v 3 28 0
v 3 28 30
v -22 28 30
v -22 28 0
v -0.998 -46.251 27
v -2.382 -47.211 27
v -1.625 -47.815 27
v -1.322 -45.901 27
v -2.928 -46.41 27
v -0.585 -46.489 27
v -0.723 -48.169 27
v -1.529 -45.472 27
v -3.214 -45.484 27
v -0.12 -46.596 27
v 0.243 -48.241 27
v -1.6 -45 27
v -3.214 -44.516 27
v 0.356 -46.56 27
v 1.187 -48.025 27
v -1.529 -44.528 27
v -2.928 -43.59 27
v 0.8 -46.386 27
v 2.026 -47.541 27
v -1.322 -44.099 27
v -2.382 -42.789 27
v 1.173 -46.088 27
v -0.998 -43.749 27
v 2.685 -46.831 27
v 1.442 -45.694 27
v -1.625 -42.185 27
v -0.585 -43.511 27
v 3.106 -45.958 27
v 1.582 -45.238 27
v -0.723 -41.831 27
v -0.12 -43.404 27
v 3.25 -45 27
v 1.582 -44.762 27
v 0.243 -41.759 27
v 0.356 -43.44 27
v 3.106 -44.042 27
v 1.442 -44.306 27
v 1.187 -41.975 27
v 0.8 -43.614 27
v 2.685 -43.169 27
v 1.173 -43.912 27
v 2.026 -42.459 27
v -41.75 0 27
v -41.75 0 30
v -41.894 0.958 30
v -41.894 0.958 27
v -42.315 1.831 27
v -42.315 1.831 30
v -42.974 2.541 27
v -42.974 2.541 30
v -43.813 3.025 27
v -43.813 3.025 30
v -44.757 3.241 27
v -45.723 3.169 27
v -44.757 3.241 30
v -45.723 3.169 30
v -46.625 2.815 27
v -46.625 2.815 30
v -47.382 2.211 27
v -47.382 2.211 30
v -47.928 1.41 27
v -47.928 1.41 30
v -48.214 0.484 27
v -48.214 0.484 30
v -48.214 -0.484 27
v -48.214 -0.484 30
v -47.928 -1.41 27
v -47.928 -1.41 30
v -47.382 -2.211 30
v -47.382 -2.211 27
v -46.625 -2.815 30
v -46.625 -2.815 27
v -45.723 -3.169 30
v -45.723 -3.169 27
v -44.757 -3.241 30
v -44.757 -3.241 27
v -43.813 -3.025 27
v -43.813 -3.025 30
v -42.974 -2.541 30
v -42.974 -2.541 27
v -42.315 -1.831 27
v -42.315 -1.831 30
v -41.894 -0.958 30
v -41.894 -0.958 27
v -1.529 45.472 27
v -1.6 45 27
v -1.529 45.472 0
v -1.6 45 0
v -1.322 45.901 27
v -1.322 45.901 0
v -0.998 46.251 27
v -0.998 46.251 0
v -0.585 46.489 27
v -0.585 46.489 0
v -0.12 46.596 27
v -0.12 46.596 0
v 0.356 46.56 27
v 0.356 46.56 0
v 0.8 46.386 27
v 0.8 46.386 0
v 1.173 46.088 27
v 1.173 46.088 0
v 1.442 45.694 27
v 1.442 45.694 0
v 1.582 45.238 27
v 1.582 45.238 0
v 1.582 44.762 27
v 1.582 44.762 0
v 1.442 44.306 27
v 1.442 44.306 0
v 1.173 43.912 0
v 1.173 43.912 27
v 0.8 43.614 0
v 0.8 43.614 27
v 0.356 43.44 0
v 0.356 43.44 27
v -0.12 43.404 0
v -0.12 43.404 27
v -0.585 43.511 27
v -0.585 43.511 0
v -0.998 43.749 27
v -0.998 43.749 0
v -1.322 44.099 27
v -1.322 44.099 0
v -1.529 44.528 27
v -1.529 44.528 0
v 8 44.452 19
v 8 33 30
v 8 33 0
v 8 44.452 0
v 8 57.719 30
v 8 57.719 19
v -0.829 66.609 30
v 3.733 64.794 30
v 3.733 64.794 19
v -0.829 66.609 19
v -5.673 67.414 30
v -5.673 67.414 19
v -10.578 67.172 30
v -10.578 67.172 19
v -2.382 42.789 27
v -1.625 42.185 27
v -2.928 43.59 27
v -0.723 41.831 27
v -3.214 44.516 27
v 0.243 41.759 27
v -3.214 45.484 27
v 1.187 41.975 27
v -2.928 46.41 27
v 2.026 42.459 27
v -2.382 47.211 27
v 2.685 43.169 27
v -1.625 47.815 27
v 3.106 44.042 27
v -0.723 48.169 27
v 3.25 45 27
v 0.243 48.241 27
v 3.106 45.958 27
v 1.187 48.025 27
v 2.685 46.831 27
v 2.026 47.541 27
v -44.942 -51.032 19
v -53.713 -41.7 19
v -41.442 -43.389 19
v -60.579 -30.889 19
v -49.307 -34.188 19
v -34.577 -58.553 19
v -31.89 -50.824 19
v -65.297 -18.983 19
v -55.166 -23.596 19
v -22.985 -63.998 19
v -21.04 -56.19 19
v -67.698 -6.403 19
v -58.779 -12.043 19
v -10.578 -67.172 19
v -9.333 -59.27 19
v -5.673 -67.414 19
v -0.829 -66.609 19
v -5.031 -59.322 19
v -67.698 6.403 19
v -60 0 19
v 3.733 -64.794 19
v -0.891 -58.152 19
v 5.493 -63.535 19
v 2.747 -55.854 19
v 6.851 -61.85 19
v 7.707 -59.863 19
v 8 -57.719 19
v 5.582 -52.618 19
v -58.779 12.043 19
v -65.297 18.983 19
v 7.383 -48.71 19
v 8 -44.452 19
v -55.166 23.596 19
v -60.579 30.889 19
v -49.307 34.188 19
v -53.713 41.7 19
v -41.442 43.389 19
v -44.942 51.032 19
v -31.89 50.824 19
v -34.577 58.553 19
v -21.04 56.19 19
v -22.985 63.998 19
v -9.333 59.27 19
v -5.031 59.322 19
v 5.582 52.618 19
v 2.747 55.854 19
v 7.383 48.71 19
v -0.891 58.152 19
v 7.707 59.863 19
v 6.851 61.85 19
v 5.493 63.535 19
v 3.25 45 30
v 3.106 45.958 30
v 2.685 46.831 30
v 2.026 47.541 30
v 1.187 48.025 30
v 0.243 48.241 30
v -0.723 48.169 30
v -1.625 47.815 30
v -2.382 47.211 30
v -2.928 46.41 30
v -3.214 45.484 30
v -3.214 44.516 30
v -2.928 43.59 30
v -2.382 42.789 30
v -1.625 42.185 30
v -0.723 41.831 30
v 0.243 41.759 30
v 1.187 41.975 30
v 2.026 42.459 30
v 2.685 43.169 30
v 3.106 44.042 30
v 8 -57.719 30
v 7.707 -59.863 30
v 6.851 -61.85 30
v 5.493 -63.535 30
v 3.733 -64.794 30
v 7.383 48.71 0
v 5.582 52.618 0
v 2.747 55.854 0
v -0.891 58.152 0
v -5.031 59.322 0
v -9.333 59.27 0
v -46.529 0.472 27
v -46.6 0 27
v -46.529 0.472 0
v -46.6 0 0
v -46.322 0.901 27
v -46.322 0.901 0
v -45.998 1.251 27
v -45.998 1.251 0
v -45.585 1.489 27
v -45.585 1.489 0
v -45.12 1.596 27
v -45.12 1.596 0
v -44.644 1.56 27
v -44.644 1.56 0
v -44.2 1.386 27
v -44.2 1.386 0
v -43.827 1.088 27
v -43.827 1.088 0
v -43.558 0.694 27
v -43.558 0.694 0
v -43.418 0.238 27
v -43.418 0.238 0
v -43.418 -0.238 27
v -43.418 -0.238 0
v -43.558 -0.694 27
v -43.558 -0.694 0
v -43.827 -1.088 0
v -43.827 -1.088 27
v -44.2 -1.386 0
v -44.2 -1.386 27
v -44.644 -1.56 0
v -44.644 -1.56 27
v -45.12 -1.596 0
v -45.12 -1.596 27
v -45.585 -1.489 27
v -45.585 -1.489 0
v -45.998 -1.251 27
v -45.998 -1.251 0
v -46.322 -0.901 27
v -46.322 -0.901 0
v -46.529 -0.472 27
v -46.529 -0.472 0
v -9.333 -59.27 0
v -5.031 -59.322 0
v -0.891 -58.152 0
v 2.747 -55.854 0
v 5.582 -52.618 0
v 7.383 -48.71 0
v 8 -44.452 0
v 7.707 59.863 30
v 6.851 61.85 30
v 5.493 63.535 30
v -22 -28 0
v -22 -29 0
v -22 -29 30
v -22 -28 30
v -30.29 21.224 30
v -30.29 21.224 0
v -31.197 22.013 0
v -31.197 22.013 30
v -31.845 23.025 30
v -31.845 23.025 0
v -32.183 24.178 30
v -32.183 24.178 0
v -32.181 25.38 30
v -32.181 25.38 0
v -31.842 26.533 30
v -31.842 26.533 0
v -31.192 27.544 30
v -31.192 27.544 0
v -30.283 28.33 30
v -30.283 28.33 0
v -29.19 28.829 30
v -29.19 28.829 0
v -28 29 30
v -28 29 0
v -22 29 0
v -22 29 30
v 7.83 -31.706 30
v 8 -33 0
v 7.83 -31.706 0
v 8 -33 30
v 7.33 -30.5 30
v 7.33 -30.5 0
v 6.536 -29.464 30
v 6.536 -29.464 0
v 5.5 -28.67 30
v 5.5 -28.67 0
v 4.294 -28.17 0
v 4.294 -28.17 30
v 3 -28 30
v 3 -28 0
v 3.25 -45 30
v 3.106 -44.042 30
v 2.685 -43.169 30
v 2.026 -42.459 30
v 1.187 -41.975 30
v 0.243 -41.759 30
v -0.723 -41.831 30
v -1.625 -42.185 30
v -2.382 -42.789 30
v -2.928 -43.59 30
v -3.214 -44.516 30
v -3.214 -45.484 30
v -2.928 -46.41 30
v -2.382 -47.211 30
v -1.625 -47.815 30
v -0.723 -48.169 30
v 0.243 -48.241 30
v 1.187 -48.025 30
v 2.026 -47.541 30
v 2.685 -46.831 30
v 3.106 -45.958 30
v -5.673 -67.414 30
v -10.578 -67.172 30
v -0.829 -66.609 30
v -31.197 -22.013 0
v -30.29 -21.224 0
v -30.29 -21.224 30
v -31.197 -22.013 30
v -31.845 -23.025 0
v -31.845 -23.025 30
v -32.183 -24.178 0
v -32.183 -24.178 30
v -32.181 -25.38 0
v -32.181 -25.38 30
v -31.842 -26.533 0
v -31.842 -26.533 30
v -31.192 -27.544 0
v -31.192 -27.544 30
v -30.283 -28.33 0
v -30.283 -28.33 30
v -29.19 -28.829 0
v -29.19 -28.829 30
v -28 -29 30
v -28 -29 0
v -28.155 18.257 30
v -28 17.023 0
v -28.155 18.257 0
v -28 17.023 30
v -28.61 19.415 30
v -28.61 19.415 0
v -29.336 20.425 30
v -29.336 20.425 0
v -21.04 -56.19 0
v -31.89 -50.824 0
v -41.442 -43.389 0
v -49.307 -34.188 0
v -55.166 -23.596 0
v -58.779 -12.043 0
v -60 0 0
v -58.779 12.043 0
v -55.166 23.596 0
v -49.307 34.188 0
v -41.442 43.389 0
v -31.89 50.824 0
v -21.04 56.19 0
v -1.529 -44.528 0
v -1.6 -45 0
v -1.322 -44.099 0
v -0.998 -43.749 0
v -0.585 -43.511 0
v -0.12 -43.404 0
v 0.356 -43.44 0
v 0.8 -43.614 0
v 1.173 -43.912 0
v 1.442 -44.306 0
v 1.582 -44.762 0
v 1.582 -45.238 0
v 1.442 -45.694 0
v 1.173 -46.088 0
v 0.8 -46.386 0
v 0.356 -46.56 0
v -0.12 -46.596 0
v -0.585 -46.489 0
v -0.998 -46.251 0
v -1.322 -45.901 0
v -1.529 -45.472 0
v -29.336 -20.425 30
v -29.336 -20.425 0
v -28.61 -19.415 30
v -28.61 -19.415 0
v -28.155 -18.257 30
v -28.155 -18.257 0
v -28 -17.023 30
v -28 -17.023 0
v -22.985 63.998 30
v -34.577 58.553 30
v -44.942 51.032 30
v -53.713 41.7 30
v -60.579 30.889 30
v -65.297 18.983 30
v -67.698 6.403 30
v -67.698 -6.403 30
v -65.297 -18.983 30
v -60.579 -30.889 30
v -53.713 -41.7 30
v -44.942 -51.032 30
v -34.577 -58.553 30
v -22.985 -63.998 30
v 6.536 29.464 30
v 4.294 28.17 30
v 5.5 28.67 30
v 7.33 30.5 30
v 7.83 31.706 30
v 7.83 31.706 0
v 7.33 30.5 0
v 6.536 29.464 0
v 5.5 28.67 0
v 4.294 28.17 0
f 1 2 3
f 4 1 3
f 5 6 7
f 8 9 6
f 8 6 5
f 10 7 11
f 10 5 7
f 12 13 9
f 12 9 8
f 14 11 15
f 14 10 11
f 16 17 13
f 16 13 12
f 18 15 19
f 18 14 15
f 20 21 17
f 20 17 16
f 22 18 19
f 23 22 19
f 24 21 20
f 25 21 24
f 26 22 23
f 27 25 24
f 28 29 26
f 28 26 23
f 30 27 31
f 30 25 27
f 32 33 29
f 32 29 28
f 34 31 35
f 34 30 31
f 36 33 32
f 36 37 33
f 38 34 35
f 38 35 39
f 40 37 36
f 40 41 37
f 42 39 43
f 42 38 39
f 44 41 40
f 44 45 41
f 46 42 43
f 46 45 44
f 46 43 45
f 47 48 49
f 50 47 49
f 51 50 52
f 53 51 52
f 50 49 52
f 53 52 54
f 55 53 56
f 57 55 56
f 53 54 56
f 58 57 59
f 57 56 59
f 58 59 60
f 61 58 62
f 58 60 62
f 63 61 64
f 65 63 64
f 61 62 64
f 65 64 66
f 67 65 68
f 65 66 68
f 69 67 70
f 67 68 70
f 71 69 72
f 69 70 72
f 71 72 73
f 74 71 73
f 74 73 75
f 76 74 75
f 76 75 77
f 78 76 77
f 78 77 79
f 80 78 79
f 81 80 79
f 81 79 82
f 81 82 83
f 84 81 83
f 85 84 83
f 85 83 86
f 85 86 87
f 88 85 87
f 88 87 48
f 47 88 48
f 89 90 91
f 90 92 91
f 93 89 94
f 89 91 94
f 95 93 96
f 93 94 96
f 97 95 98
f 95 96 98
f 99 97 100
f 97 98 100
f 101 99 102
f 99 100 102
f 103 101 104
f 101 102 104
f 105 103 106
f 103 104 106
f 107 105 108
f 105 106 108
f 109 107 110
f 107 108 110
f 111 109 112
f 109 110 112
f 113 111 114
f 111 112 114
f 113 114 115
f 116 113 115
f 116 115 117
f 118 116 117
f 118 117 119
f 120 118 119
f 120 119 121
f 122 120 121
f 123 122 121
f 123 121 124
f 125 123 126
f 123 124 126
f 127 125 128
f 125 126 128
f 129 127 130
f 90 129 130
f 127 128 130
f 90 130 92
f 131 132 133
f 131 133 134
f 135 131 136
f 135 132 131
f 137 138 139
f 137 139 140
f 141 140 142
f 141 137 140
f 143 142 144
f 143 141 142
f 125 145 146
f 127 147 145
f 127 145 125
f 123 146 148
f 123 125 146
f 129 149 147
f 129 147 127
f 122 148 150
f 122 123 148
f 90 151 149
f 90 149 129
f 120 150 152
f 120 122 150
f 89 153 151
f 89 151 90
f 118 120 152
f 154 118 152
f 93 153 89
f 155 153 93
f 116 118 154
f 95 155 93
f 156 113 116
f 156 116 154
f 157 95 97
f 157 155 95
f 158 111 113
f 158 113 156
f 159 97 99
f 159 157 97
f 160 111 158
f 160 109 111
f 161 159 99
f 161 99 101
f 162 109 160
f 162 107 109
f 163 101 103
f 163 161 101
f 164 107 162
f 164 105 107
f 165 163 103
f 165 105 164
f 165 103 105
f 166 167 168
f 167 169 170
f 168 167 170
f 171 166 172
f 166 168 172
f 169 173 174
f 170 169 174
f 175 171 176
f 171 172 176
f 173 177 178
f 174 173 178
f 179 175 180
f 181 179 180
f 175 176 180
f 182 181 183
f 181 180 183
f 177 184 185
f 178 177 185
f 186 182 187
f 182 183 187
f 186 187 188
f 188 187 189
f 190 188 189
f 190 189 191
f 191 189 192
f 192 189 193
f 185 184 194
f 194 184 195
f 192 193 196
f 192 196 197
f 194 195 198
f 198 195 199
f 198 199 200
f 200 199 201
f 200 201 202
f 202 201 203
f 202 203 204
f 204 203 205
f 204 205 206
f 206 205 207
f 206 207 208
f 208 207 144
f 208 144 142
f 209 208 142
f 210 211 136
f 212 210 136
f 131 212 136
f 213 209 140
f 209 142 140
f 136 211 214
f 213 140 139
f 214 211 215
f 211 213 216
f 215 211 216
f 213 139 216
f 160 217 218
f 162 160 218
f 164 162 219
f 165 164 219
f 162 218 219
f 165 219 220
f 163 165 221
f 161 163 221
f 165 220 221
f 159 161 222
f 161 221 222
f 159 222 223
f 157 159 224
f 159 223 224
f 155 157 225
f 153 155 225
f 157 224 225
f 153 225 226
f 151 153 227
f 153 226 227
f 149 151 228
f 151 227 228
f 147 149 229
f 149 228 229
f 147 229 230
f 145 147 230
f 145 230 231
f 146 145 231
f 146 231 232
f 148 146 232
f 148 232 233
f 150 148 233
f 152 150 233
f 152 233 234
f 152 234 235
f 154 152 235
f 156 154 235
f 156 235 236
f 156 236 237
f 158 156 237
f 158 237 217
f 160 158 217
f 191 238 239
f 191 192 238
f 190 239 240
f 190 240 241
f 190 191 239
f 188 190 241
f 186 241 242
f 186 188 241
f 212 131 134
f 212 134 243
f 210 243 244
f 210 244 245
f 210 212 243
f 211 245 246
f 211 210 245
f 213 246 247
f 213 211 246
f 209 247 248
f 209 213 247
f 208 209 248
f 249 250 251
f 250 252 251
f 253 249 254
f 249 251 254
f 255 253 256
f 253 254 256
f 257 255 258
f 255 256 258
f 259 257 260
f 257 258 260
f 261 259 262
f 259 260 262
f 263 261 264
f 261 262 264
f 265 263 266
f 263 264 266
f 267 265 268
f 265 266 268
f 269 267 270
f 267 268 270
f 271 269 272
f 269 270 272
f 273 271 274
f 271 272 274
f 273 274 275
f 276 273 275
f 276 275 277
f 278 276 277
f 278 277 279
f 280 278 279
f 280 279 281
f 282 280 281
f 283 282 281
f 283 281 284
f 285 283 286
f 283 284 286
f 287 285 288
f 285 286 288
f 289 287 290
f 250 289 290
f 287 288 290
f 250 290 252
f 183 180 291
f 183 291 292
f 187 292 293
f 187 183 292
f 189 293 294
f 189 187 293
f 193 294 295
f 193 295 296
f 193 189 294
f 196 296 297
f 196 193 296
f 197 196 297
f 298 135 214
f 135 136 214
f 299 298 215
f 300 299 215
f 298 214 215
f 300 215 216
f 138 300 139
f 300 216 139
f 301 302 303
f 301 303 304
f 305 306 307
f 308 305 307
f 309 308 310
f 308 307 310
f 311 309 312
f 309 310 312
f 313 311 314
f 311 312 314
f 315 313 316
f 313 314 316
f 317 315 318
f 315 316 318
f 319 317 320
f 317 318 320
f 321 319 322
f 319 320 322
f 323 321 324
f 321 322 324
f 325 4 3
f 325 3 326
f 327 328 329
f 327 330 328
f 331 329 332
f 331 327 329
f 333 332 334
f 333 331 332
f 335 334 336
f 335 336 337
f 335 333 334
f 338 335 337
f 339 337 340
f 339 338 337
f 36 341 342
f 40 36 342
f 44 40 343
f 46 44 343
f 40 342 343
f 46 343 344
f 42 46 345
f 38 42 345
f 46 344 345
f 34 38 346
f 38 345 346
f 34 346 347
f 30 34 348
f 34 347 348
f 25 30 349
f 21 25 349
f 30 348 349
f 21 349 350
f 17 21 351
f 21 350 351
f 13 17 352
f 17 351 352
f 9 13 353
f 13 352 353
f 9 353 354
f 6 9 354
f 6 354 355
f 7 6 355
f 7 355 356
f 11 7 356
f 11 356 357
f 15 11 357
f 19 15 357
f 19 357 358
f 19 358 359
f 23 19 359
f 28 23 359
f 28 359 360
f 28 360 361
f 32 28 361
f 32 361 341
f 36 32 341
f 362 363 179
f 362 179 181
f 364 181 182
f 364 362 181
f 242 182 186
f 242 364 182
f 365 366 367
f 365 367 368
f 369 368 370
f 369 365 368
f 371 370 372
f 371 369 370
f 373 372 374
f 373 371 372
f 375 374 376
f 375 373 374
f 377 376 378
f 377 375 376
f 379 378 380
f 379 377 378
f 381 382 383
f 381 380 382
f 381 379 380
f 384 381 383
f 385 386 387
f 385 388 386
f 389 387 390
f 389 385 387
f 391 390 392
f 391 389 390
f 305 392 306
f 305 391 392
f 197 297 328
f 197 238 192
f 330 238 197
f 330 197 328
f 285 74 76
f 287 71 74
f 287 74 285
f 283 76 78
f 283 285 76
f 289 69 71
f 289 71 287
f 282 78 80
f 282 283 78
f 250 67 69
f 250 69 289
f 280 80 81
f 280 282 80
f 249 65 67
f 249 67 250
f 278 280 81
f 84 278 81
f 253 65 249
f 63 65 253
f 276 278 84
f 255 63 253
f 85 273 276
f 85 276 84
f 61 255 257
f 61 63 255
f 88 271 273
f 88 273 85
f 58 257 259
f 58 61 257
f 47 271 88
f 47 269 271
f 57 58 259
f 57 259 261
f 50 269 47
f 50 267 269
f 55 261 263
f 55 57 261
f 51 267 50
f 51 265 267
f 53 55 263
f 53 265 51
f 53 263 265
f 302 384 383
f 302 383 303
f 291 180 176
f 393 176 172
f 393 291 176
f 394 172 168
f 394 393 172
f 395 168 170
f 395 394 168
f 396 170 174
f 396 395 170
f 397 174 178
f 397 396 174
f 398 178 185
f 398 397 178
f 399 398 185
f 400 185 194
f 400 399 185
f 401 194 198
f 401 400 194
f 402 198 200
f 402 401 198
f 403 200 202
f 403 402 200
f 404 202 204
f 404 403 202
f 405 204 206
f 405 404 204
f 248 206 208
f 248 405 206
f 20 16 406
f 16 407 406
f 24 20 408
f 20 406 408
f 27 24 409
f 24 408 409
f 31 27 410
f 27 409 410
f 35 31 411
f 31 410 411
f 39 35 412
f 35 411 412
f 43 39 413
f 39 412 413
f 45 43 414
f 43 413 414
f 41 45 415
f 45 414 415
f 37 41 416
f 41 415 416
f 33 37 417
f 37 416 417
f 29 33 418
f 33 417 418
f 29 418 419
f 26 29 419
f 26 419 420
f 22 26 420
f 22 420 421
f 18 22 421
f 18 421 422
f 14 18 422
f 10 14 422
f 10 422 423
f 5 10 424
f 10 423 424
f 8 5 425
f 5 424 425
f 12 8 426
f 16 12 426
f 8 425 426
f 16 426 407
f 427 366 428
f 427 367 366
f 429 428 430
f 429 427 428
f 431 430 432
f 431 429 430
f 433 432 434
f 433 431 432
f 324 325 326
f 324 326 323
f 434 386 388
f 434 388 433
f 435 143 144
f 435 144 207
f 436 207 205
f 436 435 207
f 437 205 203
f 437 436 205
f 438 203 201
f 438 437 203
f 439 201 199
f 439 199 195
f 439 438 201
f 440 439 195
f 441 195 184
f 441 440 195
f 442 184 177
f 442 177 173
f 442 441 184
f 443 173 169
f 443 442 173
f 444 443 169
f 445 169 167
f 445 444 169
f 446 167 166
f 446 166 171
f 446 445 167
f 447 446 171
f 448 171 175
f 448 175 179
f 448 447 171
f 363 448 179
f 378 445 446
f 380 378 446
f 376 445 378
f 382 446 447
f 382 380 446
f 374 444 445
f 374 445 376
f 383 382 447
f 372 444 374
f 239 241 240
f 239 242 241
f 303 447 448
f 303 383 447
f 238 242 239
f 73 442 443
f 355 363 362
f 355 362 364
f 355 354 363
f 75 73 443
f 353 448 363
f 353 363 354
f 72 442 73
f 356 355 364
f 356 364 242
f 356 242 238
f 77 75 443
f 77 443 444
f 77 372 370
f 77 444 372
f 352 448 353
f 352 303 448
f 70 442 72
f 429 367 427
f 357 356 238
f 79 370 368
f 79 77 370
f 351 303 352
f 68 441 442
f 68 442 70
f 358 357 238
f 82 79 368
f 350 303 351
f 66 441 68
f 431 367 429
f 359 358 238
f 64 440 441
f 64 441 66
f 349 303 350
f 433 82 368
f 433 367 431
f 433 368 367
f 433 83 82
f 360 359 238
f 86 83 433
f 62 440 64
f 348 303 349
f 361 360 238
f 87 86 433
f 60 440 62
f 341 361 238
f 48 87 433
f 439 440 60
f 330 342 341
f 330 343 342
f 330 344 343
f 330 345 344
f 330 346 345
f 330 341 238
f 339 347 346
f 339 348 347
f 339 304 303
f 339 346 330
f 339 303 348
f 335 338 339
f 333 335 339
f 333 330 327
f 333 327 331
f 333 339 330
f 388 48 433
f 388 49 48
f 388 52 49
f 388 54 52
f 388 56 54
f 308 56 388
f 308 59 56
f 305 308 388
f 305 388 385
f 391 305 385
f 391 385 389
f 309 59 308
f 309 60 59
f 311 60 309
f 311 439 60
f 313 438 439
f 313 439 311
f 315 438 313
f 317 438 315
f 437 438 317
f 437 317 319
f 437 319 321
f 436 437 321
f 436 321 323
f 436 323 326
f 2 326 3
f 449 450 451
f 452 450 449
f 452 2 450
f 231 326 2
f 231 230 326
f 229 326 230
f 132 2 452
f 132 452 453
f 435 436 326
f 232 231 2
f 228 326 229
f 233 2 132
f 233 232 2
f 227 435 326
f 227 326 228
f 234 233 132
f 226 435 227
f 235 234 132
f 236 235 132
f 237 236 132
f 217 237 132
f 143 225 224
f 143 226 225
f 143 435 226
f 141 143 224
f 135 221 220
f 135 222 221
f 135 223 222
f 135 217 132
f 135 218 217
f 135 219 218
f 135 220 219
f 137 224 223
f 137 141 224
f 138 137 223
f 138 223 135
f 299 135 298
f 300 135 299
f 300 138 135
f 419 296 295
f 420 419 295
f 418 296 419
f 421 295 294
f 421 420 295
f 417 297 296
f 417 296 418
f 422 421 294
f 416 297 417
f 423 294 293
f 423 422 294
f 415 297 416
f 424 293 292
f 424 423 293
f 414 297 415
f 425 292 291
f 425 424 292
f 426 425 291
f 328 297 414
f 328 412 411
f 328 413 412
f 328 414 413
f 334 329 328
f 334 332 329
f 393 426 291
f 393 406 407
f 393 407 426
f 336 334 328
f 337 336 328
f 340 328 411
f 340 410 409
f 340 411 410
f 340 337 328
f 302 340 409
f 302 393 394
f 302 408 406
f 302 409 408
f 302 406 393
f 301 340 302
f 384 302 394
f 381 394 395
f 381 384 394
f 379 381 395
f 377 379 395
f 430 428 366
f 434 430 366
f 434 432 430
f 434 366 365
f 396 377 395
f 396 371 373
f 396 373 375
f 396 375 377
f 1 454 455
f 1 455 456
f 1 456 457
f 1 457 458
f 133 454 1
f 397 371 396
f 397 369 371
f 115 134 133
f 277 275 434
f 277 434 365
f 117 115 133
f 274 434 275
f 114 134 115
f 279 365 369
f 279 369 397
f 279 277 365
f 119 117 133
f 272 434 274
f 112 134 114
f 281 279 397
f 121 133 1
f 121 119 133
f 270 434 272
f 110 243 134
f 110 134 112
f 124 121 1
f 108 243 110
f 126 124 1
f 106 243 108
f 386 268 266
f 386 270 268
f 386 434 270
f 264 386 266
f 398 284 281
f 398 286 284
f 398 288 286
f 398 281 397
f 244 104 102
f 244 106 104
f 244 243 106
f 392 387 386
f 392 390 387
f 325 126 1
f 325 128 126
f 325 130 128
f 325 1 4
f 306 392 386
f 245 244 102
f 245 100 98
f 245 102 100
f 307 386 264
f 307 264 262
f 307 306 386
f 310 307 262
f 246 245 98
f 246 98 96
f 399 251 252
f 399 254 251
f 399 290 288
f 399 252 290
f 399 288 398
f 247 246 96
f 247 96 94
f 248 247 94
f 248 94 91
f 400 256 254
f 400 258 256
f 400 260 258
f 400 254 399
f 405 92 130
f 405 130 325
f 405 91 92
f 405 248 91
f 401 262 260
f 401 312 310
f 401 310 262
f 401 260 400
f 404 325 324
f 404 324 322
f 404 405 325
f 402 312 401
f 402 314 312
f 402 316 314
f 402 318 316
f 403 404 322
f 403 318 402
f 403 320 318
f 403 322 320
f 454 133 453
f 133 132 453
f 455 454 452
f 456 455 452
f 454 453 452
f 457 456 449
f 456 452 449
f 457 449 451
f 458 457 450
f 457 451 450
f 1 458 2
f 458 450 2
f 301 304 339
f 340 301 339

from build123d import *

# Parameters (mm, degrees)
EXTRUDE_1_DEPTH              = 30
HOLE_WIZARD_M3_1_D           = 3.2
HOLE_WIZARD_M3_1_CBORE_D     = 6.5
HOLE_WIZARD_M3_1_CBORE_DEPTH = 3
FILLET_1_R                   = 15
CUT_EXTRUDE_1782_DEPTH       = 90.635744244
FILLET_2_R                   = 5
EXTRUDE_2_DEPTH              = 11
FILLET_3_R                   = 8


with BuildPart() as part:
    # ｽｹｯﾁ1 → ﾎﾞｽ - 押し出し1 (new body)
    with BuildSketch(Plane.XY):
        with BuildLine():
            Line((8, 59.464274989), (8, 28))
            Line((8, 28), (-22, 28))
            Line((-22, 28), (-22, 29))
            Line((-22, 29), (-28, 29))
            Line((-28, 29), (-28, -29))
            Line((-28, -29), (-22, -29))
            Line((-22, -29), (-22, -28))
            Line((-22, -28), (8, -28))
            Line((8, -28), (8, -59.464274989))
            ThreePointArc((8, -59.464274989), (-60, 0), (8, 59.464274989))
        make_face()
    extrude(amount=EXTRUDE_1_DEPTH)

    # M3 穴付きねじ用座ぐり穴1 (through all)
    with Locations(Plane(origin=(0, 45, 30), x_dir=(1, 0, 0), z_dir=(0, 0, 1))):
        with Locations((0, 0), (-45, -45), (0, -90)):
            CounterBoreHole(HOLE_WIZARD_M3_1_D / 2, HOLE_WIZARD_M3_1_CBORE_D / 2, HOLE_WIZARD_M3_1_CBORE_DEPTH)

    # ﾌｨﾚｯﾄ1
    fillet_1_edges = [part.edges().sort_by_distance(p)[0] for p in [
        (8, 59.464274989, 15),
        (8, -59.464274989, 15),
    ]]
    fillet(fillet_1_edges, radius=FILLET_1_R)

    # ｽｹｯﾁ3 → Cut-Extrude 1782 (cut, through all)
    with BuildSketch(Plane.XY):
        with BuildLine():
            Line((-28, 29), (-28, 20.55))
            ThreePointArc((-28, 20.55), (-32.225, 24.775), (-28, 29))
        make_face()
        with BuildLine():
            Line((-28, -29), (-28, -20.55))
            ThreePointArc((-28, -20.55), (-32.225, -24.775), (-28, -29))
        make_face()
    extrude(amount=CUT_EXTRUDE_1782_DEPTH, mode=Mode.SUBTRACT)

    # ﾌｨﾚｯﾄ2
    fillet_2_edges = [part.edges().sort_by_distance(p)[0] for p in [
        (8, 28, 15),
        (8, -28, 15),
        (-28, 20.55, 15),
        (-28, -20.55, 15),
    ]]
    fillet(fillet_2_edges, radius=FILLET_2_R)

    # ｽｹｯﾁ4 → ﾎﾞｽ - 押し出し2 (add)
    with BuildSketch(Plane.XY.offset(30)):
        with BuildLine():
            Line((8, 44.452221542), (8, 61.887817316))
            ThreePointArc((8, 61.887817316), (-0.707298954, 66.574651642), (-10.577777778, 67.172245885))
            ThreePointArc((-10.577777778, 67.172245885), (-68, 0), (-10.577777778, -67.172245885))
            ThreePointArc((-10.577777778, -67.172245885), (-0.707298954, -66.574651642), (8, -61.887817316))
            Line((8, -61.887817316), (8, -44.452221542))
            ThreePointArc((8, -44.452221542), (2.746794345, -55.853975793), (-9.333333333, -59.269628722))
            ThreePointArc((-9.333333333, -59.269628722), (-60, 0), (-9.333333333, 59.269628722))
            ThreePointArc((-9.333333333, 59.269628722), (2.746794345, 55.853975793), (8, 44.452221542))
        make_face()
    extrude(amount=-EXTRUDE_2_DEPTH)

    # ﾌｨﾚｯﾄ3
    fillet_3_edges = [part.edges().sort_by_distance(p)[0] for p in [
        (8, -61.887817316, 24.5),
        (8, 61.887817316, 24.5),
    ]]
    fillet(fillet_3_edges, radius=FILLET_3_R)


solid = part.part
